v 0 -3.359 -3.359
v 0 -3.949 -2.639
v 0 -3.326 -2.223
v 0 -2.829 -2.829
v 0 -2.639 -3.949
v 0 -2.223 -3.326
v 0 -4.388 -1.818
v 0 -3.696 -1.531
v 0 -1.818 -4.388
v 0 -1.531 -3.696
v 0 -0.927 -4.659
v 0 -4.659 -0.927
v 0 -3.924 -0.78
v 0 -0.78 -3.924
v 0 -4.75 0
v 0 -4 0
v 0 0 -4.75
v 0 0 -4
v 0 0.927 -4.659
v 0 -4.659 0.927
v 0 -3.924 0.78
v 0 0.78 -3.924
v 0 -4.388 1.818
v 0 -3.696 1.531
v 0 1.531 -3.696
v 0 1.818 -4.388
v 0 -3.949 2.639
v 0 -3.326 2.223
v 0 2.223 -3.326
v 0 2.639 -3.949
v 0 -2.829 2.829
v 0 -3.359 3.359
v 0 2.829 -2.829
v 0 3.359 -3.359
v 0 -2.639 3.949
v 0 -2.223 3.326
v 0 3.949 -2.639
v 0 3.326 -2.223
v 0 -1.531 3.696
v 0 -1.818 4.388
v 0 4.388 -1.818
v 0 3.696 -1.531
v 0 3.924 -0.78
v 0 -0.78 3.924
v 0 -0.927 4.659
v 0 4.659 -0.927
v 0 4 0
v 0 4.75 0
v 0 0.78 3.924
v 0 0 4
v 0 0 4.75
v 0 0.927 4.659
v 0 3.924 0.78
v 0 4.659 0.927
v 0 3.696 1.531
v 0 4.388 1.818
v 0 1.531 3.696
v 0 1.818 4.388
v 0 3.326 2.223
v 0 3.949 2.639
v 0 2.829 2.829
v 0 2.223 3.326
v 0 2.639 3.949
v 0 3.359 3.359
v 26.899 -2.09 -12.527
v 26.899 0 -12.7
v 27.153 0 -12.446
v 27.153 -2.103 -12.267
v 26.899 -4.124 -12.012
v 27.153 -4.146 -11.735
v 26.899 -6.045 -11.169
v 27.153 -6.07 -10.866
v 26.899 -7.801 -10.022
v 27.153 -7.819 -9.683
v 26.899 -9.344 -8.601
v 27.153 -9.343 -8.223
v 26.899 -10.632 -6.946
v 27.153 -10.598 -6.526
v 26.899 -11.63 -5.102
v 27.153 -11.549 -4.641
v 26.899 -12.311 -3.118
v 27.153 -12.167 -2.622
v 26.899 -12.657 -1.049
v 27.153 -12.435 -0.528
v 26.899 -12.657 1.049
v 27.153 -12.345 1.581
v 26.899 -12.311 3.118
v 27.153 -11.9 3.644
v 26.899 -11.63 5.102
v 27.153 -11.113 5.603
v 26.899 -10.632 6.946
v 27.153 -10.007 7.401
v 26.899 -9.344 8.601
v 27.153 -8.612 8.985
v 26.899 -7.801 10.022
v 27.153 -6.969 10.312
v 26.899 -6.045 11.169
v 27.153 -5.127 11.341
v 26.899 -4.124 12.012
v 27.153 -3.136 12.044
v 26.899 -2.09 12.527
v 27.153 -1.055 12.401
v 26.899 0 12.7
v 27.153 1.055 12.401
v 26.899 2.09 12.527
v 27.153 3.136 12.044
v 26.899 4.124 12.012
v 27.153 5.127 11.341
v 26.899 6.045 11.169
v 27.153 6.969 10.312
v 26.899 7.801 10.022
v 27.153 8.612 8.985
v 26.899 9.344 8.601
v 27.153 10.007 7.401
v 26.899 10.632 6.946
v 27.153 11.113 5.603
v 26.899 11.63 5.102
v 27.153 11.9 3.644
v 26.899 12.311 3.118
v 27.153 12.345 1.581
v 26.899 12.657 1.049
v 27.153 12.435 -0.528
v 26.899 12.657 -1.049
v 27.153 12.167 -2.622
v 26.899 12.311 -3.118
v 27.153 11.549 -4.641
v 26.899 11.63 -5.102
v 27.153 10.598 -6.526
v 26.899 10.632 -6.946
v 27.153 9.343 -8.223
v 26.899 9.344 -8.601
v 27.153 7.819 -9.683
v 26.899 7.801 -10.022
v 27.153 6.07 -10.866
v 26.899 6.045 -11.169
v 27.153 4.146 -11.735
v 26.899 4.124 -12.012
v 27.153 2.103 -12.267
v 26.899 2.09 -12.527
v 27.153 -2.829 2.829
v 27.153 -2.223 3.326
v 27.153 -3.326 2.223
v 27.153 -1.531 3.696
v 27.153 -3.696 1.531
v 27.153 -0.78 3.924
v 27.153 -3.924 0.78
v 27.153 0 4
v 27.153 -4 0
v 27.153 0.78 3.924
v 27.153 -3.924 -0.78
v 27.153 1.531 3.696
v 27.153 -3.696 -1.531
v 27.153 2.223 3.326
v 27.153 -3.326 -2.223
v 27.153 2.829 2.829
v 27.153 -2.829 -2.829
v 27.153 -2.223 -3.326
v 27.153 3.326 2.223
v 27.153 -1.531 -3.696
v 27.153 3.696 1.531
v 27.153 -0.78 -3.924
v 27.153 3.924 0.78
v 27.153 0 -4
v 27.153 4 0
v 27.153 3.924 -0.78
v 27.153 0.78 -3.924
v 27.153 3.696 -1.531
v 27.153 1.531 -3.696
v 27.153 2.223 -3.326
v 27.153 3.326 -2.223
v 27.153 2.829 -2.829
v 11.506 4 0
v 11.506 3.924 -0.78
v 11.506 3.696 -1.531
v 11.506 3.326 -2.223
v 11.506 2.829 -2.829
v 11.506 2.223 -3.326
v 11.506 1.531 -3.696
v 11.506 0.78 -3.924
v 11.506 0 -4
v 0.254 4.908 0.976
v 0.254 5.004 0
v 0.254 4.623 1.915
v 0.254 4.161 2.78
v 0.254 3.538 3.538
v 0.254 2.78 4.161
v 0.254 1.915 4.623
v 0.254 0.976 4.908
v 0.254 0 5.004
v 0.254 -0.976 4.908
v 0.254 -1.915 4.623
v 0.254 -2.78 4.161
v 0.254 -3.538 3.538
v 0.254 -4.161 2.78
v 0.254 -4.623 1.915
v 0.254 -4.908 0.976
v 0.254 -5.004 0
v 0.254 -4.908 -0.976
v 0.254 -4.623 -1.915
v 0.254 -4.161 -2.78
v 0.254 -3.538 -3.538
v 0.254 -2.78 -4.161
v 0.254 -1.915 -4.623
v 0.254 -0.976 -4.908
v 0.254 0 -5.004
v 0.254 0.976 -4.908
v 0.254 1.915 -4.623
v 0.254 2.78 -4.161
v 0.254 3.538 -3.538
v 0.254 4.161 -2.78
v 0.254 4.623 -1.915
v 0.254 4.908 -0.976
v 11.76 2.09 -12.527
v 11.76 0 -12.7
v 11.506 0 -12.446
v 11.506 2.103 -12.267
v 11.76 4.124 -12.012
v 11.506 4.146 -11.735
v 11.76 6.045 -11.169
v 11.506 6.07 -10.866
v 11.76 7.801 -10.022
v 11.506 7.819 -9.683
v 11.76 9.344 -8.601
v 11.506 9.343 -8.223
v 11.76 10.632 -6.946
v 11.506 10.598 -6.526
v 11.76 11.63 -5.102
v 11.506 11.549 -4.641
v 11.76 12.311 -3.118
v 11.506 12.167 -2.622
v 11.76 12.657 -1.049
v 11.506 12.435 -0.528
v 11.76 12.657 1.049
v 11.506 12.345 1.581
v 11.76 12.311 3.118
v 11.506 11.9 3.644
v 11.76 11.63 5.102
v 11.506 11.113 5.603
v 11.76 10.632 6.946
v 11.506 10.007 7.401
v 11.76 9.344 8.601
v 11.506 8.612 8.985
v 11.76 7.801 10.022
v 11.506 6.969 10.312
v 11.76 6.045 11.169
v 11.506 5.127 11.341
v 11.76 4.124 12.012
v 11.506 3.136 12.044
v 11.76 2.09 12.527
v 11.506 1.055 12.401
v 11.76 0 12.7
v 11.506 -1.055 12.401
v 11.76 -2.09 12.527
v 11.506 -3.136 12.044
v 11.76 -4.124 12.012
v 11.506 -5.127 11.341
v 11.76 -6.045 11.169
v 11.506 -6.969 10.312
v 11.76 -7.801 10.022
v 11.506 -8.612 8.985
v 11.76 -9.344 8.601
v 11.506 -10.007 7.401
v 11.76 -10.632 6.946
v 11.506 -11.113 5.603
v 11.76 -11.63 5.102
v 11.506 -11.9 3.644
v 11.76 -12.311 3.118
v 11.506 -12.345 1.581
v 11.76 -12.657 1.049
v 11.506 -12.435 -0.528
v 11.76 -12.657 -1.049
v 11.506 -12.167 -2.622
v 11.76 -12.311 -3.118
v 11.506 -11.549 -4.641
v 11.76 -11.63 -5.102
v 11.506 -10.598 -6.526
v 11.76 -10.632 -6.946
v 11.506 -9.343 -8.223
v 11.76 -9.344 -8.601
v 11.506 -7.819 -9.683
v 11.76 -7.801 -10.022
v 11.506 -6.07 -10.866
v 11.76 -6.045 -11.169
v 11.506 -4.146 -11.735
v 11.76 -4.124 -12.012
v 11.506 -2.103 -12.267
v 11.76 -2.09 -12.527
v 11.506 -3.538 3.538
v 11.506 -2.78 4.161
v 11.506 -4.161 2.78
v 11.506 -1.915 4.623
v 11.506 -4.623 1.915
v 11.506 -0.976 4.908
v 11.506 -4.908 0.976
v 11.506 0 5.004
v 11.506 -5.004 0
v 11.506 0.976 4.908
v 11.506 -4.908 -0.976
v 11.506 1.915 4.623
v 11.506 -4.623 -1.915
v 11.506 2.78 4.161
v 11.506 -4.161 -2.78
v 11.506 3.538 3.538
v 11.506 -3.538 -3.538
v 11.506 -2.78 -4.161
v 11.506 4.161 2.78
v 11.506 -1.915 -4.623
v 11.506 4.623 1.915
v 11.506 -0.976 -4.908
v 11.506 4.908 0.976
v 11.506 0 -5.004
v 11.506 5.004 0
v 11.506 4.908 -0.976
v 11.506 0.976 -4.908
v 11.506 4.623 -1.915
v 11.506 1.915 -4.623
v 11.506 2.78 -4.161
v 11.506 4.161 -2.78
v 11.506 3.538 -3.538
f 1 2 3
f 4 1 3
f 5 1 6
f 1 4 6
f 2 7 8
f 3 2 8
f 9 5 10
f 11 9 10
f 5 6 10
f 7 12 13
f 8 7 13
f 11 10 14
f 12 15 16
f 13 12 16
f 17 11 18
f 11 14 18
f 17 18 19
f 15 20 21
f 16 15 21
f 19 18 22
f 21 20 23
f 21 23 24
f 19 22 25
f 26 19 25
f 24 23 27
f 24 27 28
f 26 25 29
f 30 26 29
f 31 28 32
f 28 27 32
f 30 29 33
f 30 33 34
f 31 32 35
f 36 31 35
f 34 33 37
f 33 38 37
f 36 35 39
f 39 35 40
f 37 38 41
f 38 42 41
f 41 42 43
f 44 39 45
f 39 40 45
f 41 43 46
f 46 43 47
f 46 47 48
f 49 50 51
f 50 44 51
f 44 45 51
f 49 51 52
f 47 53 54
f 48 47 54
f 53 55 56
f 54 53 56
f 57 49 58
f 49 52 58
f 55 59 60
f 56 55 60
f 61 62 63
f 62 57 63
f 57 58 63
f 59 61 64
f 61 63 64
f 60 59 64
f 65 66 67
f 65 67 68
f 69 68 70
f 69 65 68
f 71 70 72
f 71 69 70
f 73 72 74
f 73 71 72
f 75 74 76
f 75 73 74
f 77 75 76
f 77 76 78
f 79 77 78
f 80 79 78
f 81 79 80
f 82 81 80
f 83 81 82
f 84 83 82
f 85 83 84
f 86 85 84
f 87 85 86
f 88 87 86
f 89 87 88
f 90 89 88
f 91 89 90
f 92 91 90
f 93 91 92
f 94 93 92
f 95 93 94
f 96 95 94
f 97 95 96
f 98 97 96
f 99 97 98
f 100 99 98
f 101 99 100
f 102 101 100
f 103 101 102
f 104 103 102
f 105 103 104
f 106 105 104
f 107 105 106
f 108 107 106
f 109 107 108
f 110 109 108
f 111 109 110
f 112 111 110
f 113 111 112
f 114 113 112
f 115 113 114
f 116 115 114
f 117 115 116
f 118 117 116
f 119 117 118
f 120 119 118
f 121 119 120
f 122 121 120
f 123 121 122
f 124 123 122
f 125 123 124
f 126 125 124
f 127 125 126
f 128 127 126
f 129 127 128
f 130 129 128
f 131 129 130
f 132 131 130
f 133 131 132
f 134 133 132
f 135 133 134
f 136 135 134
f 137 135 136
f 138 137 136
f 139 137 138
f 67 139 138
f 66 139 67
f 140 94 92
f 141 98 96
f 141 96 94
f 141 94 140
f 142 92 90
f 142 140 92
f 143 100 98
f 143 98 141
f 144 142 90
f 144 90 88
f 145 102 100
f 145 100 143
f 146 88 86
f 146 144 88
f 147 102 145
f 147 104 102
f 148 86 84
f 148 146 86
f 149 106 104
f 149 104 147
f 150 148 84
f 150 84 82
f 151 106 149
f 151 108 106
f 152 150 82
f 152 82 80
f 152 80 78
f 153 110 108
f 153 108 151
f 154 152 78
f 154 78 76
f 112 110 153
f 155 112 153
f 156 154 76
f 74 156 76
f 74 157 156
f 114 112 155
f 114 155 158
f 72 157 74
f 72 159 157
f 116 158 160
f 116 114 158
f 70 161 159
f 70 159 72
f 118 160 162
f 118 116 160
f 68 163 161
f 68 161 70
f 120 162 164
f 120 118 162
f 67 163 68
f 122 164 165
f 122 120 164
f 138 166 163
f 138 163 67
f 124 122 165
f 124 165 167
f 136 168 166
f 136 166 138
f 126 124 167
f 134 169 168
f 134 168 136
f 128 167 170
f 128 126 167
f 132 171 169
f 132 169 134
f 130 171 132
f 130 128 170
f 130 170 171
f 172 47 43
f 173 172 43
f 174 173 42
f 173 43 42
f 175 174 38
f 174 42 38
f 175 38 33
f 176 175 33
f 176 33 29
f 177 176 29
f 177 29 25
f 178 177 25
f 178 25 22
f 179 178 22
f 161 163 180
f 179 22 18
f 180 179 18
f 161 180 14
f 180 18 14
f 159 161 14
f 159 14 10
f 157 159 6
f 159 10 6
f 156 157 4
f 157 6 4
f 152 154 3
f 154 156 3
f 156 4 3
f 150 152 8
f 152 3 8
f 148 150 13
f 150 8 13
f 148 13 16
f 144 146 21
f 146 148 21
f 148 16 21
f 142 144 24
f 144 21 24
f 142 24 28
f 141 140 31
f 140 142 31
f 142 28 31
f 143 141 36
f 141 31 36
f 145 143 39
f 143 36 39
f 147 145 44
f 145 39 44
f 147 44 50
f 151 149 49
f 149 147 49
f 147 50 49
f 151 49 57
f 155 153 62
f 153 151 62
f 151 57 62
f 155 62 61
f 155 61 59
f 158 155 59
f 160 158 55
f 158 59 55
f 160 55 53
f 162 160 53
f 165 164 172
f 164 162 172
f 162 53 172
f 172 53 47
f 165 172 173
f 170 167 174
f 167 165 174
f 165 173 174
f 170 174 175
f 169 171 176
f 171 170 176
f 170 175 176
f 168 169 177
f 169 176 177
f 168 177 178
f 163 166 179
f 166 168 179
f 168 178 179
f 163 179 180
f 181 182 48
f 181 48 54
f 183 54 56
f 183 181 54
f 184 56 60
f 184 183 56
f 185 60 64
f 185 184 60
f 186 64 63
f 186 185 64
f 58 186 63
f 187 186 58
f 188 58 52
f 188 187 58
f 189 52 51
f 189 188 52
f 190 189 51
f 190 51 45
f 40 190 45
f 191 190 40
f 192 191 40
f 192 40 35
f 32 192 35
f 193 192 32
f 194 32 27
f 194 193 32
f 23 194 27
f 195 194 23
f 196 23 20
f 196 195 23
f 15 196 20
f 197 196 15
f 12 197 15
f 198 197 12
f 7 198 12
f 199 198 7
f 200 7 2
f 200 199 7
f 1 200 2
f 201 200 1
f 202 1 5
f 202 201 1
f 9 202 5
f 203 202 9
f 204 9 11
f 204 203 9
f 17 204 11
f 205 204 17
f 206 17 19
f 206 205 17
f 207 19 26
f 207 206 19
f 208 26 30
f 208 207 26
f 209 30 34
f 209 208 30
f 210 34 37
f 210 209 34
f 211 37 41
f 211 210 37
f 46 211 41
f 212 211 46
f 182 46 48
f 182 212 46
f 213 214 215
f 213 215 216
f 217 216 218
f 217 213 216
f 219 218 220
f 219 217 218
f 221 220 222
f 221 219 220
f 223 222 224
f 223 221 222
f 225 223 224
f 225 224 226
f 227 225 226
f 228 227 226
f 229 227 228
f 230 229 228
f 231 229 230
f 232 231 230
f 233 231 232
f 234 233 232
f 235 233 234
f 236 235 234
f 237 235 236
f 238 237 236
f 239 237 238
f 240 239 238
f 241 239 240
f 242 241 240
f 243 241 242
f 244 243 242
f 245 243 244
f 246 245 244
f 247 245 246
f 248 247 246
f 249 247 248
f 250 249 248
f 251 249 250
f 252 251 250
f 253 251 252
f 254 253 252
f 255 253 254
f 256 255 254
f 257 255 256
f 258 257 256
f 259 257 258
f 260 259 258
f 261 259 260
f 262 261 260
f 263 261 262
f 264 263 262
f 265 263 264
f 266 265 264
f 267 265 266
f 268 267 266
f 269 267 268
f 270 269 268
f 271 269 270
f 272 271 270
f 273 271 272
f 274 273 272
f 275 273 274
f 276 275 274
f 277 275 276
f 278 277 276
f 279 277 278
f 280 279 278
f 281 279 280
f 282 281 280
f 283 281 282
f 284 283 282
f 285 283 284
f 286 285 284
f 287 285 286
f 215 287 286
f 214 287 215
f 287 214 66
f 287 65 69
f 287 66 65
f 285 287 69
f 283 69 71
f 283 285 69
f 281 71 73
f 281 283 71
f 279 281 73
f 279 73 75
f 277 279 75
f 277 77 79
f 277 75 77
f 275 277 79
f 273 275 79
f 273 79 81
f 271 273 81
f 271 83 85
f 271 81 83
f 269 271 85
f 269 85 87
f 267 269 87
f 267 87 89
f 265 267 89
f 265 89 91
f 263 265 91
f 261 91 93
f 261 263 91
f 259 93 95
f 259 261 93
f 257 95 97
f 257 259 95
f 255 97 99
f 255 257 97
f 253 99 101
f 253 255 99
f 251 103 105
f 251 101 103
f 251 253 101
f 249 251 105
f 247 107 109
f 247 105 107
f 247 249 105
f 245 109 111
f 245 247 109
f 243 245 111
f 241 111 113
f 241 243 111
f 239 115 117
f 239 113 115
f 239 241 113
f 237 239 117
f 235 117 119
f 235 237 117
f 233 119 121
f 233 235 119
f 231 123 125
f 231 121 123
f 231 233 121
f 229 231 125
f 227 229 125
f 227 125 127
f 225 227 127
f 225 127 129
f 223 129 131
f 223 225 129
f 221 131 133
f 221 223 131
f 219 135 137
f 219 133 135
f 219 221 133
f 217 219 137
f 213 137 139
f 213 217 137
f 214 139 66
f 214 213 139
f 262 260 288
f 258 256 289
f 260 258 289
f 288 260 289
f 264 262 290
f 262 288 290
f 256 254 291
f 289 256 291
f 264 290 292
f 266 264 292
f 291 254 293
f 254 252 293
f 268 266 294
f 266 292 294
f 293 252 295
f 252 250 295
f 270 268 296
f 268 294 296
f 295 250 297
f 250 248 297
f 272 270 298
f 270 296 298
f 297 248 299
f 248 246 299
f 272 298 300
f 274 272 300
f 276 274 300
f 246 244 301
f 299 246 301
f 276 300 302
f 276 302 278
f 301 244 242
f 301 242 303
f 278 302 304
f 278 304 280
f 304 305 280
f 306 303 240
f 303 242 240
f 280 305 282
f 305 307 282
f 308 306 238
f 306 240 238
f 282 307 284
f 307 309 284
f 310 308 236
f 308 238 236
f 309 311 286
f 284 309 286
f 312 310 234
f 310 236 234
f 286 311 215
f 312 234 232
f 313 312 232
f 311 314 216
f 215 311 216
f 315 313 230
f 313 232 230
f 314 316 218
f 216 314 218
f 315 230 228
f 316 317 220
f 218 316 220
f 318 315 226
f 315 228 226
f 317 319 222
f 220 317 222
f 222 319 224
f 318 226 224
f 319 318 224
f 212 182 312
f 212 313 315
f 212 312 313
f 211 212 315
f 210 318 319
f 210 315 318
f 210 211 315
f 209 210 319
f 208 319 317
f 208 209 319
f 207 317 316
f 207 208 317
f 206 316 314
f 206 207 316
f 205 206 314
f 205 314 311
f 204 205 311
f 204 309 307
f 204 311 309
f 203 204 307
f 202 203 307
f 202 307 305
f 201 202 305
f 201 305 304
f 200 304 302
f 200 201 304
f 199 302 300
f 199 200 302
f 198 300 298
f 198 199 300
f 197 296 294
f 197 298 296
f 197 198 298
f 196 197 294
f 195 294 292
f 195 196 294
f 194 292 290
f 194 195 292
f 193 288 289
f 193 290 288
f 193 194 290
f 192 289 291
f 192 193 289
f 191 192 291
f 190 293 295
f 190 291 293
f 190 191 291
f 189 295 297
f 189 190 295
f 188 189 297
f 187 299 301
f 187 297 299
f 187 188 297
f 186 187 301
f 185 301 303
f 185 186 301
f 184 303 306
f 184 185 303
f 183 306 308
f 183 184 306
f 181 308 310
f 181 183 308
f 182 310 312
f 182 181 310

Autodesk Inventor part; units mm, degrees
ref_plane "YZ Plane" through (0, 0, 0) normal (1, 0, 0) x (0, 1, 0)
ref_plane "XZ Plane" through (0, 0, 0) normal (0, 1, 0) x (-1, 0, 0)
ref_plane "XY Plane" through (0, 0, 0) normal (0, 0, 1) x (1, 0, 0)
sketch "Sketch1" plane through (0, 0, 0) normal (1, 0, 0) x (0, 1, 0)
  circle A0 centre (0, 0) radius 5.0038
  circle A1 centre (0, 0) radius 4.0005
  dimension "d0" = 10.0076
  dimension "d1" = 8.001
extrude "Extrusion1" add sketch "Sketch1" along normal blind 11.5062
sketch "Sketch2" plane through (11.5062, 0, 0) normal (1, 0, 0) x (0, 0, -1)
  circle A0 centre (0, 0) radius 12.7
  circle A1 centre (0, 0) radius 4.0005
  dimension "d4" = 25.4
  dimension "d7" = 8.001
extrude "Extrusion2" add sketch "Sketch2" along normal blind 15.6464
chamfer "Chamfer1" distance 0.254 angle 45 3 edges at (0, -5.0038, 0) (11.5062, 0, 12.7) (27.1526, 0, 12.7)
properties part number "Flex_Bushing"
